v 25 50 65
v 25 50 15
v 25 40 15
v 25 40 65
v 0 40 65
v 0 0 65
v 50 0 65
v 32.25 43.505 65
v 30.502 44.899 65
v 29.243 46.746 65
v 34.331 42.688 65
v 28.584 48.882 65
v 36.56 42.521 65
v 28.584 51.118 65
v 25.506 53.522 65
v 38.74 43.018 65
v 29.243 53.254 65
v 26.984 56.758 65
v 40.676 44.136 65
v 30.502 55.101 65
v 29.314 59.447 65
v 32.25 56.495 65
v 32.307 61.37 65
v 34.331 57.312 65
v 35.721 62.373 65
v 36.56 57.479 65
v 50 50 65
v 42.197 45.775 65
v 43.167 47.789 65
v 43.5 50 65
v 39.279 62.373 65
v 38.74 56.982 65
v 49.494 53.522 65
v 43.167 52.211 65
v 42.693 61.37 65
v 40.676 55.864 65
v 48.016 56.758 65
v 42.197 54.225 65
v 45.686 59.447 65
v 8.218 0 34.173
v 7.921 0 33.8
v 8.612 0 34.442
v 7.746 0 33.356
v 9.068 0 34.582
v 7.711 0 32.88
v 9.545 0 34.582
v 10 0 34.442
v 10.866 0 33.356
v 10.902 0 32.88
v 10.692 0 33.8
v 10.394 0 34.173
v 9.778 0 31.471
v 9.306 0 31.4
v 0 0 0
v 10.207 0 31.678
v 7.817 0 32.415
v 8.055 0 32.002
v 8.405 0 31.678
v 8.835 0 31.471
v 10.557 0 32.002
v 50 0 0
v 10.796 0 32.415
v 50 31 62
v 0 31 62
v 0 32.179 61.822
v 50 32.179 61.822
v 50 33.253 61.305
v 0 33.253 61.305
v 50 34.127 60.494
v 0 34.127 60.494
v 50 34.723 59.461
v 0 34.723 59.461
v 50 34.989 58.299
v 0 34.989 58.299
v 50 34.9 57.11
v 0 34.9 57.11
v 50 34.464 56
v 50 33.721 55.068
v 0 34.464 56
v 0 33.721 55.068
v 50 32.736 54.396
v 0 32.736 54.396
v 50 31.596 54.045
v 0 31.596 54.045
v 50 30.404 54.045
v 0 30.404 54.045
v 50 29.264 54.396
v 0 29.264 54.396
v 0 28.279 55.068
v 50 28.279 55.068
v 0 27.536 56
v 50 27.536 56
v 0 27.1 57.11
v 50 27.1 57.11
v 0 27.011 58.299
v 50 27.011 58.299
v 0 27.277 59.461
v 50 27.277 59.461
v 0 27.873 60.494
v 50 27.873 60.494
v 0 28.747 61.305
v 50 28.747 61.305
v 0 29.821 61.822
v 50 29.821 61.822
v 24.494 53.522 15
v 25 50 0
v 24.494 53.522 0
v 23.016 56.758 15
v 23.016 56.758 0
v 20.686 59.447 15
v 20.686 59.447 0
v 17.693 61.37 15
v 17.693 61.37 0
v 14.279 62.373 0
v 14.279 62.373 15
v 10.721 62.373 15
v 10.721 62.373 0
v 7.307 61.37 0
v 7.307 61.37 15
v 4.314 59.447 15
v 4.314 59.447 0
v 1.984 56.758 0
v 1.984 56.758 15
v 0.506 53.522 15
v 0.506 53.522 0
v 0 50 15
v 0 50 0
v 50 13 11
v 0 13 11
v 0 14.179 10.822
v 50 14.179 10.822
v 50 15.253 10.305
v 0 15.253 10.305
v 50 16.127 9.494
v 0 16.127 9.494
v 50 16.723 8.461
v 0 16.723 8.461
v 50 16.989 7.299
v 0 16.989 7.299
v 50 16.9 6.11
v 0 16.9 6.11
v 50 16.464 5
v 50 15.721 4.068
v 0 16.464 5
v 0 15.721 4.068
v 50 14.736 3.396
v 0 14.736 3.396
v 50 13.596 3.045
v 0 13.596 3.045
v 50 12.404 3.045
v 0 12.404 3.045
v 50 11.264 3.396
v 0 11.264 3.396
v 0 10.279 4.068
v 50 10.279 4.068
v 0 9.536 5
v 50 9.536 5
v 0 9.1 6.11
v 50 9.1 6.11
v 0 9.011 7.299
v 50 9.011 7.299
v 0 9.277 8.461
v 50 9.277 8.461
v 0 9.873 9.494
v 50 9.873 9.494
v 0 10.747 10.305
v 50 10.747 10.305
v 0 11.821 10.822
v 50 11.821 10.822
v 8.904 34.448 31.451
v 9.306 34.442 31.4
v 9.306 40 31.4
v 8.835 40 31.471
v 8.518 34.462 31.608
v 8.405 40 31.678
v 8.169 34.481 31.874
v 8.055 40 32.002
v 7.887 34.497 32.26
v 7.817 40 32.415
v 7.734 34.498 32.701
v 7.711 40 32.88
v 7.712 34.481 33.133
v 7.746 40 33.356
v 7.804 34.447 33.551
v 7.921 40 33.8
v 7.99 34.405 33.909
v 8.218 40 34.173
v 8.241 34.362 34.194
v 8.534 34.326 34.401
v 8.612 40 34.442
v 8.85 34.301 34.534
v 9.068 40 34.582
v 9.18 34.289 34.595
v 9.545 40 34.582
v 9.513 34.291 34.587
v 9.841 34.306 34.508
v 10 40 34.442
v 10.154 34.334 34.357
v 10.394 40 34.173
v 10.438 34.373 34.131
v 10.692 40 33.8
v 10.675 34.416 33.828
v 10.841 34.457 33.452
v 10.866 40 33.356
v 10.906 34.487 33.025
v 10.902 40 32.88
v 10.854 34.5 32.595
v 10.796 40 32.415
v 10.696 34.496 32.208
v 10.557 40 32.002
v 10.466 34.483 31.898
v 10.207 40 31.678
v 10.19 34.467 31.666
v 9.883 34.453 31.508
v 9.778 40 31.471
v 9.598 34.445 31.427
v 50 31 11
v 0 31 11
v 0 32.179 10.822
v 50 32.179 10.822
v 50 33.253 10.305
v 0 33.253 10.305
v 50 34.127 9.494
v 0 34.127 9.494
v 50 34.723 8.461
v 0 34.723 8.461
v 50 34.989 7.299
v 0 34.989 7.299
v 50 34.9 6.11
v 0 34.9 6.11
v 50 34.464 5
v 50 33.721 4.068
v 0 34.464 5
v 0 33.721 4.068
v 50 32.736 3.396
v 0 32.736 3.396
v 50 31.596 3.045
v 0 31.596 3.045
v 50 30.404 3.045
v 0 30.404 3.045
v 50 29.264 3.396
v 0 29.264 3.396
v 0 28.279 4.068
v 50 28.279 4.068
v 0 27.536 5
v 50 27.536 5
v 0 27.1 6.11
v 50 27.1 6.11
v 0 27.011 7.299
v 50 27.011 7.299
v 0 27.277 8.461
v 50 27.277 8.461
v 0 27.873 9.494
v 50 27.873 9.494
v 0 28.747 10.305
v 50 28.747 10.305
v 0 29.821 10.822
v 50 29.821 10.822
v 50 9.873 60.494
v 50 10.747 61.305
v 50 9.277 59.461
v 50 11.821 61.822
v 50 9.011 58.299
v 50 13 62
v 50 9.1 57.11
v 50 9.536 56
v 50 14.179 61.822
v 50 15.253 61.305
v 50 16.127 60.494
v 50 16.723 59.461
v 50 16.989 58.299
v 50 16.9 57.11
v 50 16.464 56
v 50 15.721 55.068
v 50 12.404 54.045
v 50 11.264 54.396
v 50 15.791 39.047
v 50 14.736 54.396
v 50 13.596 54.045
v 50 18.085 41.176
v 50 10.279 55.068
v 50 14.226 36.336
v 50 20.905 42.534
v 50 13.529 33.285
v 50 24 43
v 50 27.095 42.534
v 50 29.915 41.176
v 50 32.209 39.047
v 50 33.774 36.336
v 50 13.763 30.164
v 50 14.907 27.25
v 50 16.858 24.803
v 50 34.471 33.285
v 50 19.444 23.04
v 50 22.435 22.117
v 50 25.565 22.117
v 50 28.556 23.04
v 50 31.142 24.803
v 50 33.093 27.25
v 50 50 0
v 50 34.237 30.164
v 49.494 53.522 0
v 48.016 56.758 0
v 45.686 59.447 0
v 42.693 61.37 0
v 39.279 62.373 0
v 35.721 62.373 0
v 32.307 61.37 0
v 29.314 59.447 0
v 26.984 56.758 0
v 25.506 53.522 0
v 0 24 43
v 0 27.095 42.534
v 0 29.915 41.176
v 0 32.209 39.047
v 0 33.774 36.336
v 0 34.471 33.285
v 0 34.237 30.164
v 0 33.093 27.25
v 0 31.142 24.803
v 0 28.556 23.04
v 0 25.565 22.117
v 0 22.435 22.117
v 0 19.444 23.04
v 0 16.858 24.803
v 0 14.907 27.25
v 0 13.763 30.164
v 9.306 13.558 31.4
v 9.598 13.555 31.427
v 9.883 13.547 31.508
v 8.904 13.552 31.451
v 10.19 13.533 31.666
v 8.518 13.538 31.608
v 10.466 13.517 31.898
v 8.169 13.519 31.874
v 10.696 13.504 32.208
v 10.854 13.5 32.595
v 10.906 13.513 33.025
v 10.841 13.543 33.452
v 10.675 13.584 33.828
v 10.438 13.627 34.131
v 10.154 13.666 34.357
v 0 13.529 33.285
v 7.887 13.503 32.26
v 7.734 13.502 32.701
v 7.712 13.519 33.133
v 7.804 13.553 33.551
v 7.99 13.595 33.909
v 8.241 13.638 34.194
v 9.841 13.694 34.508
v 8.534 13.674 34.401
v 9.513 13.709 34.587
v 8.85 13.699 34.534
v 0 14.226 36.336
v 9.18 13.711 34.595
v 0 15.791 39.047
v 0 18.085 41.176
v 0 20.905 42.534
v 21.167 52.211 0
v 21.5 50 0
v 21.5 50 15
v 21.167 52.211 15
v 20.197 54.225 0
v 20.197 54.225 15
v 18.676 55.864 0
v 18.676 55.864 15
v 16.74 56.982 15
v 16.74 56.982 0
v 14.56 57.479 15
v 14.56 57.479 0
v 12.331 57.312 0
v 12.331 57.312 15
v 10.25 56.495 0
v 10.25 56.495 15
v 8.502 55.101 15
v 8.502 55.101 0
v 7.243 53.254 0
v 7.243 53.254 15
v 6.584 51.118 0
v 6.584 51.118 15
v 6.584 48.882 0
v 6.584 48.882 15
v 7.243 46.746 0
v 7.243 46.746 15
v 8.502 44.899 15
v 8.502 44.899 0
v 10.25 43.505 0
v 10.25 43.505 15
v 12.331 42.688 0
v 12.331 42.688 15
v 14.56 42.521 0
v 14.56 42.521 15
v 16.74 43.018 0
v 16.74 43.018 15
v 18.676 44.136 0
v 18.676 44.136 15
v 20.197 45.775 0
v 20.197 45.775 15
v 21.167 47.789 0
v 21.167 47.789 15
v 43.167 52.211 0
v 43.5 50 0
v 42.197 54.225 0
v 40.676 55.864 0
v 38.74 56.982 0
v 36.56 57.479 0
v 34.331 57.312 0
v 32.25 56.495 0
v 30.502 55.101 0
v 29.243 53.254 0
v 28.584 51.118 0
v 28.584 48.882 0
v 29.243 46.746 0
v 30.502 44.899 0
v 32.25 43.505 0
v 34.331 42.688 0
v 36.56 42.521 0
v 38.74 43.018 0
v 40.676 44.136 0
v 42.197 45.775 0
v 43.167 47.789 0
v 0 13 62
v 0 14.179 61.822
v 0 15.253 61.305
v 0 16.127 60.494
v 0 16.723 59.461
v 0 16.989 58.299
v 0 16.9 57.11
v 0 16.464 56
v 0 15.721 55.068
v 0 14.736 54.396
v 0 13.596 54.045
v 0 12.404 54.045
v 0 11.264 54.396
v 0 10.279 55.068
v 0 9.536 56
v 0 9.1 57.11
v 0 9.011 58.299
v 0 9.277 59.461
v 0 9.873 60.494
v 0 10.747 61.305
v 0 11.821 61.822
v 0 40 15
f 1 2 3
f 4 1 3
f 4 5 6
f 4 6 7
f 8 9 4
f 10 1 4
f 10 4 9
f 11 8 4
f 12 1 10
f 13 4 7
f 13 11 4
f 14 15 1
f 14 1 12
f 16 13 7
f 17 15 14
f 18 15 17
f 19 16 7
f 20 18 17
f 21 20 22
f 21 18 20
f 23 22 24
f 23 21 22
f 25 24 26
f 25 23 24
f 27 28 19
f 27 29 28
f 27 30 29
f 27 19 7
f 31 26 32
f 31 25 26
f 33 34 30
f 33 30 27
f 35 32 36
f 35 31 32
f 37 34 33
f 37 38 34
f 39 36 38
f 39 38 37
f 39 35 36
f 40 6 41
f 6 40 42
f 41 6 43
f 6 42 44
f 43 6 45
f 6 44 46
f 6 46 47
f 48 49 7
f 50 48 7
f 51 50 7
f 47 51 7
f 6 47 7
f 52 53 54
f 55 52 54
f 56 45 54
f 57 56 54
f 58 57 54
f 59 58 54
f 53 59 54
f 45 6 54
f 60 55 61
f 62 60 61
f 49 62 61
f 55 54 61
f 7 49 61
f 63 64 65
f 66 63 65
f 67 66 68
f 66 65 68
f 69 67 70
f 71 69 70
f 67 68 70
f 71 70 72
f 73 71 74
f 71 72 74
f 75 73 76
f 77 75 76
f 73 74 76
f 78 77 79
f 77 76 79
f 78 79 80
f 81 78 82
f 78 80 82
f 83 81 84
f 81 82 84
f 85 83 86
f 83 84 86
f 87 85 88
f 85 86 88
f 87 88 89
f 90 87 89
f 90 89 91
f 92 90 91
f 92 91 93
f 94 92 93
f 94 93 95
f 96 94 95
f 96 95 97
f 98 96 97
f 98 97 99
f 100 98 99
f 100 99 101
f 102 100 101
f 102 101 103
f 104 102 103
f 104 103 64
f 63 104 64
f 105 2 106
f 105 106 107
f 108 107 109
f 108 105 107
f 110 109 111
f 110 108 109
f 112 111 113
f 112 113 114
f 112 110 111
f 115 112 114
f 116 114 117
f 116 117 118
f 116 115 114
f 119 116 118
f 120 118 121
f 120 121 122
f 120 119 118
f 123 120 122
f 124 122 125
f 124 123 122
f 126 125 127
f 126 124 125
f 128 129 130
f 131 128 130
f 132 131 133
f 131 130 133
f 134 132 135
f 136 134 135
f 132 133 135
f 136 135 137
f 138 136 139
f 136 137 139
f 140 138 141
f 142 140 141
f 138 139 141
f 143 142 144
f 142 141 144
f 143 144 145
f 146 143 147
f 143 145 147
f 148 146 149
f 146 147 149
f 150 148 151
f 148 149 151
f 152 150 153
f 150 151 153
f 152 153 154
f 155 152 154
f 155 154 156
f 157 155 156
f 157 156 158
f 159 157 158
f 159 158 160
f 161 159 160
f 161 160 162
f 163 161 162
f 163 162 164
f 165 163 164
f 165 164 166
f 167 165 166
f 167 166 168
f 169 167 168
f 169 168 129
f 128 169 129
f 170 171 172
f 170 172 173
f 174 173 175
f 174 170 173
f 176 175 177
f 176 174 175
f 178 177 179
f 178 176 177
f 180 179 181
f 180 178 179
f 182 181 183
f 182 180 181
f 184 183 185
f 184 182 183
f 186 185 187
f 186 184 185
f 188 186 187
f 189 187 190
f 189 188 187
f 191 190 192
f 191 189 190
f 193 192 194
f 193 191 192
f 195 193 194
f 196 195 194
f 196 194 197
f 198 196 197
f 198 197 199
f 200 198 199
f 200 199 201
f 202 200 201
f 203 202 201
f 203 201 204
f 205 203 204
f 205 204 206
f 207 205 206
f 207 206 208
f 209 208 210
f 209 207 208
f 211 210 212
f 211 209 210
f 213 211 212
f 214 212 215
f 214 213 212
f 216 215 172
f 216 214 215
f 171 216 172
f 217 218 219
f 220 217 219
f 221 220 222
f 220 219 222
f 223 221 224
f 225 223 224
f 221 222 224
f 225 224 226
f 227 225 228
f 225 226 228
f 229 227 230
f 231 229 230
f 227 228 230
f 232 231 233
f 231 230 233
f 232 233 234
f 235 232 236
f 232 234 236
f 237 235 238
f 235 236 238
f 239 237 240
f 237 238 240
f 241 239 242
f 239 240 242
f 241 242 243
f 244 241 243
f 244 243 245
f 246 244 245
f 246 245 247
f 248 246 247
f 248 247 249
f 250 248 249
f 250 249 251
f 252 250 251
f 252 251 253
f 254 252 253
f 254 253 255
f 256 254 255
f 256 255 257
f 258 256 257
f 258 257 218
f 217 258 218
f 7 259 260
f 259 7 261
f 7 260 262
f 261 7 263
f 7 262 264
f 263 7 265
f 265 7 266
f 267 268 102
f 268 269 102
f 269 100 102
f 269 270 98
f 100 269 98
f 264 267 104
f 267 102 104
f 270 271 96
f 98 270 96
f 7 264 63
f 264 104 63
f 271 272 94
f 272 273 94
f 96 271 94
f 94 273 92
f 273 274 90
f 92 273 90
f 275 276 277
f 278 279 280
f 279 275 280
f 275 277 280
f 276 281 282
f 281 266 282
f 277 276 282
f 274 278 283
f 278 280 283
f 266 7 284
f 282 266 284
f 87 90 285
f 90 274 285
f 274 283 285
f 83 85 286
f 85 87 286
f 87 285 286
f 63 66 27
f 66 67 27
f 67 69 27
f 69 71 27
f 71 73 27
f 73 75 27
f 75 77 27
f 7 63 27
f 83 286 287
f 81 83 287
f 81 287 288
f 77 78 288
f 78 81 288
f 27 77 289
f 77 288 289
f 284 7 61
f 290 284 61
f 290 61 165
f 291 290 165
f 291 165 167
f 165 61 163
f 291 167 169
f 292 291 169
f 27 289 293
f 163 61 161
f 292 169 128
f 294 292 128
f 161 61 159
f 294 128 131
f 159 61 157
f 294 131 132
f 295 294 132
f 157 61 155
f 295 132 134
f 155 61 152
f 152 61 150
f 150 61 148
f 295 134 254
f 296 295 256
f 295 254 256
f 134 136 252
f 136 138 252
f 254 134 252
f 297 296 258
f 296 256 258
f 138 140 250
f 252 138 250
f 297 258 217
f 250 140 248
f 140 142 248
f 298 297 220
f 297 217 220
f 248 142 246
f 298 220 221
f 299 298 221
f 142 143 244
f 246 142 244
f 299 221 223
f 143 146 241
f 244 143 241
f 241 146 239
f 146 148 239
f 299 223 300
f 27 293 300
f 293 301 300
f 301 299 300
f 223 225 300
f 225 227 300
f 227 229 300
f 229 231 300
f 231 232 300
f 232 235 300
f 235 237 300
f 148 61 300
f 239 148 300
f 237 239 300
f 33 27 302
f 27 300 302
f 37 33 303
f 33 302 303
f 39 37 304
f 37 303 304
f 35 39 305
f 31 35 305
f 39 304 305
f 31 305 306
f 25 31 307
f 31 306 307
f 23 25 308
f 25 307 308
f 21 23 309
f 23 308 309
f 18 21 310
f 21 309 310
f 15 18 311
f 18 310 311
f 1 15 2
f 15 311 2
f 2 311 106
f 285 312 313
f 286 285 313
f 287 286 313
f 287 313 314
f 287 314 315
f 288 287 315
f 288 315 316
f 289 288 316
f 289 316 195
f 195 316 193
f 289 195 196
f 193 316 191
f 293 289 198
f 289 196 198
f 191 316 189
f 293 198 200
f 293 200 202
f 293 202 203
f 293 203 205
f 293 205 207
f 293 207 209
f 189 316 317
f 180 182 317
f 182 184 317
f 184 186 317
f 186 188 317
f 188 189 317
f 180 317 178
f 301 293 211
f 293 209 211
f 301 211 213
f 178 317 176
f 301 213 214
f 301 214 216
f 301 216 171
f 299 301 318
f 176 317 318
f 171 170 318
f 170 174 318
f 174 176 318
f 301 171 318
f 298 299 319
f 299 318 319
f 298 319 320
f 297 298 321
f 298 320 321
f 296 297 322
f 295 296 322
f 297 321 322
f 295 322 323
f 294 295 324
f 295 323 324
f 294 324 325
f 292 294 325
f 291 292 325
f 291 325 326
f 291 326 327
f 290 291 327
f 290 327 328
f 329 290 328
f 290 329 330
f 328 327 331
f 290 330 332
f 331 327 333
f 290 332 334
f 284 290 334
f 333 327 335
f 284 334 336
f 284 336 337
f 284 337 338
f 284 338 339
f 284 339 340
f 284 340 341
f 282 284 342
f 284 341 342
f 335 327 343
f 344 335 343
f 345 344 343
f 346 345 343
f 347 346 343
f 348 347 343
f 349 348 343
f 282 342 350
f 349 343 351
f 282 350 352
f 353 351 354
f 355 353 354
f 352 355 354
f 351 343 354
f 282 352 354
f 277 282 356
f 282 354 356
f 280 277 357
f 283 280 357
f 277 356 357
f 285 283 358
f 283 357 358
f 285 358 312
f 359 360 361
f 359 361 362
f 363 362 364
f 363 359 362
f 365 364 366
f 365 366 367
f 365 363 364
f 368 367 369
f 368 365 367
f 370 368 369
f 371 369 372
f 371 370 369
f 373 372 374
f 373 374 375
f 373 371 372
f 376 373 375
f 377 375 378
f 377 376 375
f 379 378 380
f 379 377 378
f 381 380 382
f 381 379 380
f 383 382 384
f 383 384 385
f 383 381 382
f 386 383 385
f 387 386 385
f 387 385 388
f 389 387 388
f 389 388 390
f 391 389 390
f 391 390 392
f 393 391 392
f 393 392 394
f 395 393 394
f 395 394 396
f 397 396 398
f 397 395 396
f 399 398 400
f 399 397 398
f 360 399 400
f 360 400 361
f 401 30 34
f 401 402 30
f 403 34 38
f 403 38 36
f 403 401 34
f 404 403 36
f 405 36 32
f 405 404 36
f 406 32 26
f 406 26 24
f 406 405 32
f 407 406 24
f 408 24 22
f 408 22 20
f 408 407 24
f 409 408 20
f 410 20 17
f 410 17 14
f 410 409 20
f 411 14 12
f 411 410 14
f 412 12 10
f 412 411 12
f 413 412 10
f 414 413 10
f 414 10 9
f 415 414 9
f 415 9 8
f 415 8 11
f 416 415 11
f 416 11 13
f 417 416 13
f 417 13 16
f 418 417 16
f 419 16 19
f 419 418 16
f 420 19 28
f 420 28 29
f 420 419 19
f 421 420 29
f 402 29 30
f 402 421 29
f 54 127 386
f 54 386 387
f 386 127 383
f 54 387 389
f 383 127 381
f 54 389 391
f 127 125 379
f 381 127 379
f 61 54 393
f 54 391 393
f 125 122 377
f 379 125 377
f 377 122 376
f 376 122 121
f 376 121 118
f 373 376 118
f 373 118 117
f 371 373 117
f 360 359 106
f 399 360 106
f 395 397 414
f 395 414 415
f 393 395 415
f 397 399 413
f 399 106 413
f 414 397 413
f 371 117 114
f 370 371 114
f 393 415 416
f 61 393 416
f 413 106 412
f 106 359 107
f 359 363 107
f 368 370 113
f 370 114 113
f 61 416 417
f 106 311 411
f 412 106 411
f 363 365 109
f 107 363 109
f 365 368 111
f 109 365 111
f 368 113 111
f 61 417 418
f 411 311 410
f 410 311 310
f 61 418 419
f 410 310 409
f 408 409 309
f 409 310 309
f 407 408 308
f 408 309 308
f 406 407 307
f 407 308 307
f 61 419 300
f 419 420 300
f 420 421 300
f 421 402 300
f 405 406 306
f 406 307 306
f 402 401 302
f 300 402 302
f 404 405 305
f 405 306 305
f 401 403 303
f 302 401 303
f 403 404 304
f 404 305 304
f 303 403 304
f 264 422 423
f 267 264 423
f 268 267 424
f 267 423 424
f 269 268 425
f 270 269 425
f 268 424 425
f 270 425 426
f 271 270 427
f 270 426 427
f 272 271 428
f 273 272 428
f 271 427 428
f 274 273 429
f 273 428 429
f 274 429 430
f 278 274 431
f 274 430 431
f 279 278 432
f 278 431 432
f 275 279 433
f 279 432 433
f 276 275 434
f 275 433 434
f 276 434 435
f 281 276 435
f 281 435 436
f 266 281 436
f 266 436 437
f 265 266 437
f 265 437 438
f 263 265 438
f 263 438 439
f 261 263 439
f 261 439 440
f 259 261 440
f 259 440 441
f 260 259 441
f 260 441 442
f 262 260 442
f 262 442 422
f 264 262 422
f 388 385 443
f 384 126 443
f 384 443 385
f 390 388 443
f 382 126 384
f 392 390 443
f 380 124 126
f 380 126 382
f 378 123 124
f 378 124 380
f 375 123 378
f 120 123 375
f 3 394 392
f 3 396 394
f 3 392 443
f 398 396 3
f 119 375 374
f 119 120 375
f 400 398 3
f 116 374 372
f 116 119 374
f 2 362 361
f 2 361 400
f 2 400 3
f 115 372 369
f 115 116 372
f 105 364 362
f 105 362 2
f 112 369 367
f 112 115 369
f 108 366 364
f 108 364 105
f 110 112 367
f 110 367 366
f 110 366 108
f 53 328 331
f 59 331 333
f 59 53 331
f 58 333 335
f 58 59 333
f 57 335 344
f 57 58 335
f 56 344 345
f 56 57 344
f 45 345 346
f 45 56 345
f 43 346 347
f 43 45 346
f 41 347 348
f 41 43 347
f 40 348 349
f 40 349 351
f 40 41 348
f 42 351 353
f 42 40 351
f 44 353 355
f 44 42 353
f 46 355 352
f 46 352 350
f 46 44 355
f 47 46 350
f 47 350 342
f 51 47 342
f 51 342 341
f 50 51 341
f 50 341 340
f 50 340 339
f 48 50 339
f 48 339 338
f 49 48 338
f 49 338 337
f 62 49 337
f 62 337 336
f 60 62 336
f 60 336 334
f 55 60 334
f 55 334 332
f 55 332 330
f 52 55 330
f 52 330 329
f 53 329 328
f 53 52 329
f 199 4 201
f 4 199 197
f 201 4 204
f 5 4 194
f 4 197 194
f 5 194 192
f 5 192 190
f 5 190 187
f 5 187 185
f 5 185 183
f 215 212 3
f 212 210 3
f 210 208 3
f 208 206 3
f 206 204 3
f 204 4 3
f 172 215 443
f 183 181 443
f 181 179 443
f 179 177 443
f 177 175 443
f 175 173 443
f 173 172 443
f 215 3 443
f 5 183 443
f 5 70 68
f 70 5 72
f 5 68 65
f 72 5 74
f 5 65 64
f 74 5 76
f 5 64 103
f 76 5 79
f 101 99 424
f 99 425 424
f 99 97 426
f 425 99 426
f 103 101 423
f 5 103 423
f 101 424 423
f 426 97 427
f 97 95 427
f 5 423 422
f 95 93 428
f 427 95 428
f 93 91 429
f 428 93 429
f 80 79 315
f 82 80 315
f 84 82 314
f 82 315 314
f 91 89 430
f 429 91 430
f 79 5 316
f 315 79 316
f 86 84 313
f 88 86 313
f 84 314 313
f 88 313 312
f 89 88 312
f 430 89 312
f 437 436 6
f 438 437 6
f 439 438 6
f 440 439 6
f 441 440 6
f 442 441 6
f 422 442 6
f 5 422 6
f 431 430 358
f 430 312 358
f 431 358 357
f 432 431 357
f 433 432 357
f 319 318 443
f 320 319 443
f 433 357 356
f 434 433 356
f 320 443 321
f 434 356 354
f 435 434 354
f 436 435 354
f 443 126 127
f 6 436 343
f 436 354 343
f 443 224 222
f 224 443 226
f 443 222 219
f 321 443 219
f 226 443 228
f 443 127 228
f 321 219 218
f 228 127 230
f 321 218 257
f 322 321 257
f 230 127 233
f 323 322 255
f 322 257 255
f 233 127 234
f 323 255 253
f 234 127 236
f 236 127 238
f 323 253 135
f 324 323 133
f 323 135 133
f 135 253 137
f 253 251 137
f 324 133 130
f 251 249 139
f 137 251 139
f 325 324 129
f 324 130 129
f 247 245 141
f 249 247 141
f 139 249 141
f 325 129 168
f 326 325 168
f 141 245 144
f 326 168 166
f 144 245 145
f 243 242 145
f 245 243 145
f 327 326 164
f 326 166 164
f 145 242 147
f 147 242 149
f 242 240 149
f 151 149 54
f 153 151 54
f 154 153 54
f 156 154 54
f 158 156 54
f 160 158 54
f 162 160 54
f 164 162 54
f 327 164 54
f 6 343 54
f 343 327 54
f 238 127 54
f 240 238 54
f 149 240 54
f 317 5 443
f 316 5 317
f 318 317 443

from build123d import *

# Parameters (mm, degrees)
SKETCH1_R               = 7.5
BOSS_EXTRUDE1_DEPTH     = 15
SKETCH2_R               = 7.5
BOSS_EXTRUDE2_DEPTH     = 50
SKETCH3_W               = 50
SKETCH3_H               = 40
BOSS_EXTRUDE3_DEPTH     = 65
CUT_EXTRUDE2_DEPTH      = 96.372952141
SKETCH9_R               = 4
SKETCH9_R_2             = 10.5
CUT_EXTRUDE3_DEPTH      = 104.107953137
CUT_EXTRUDE4_DEPTH      = 92.241437954
CUT_EXTRUDE4_DEPTH_BACK = 92.241437954
SKETCH10_R              = 1.6


with BuildPart() as part:
    # Sketch1 → Boss-Extrude1 (new body)
    with BuildSketch(Plane.XY):
        with BuildLine():
            Line((0, 0), (50, 0))
            Line((50, 0), (50, 50))
            ThreePointArc((50, 50), (40.582575695, 63.228756555), (25, 58.660254038))
            ThreePointArc((25, 58.660254038), (9.417424305, 63.228756555), (0, 50))
            Line((0, 50), (0, 0))
        make_face()
        with Locations((36, 50)):
            Circle(SKETCH1_R, mode=Mode.SUBTRACT)
        with Locations((14, 50)):
            Circle(SKETCH1_R, mode=Mode.SUBTRACT)
    extrude(amount=BOSS_EXTRUDE1_DEPTH)

    # Sketch2 → Boss-Extrude2 (add)
    with BuildSketch(Plane.XY.offset(15)):
        with BuildLine():
            Line((25, 50), (25, 0))
            Line((25, 0), (50, 0))
            Line((50, 0), (50, 50))
            ThreePointArc((50, 50), (37.5, 62.5), (25, 50))
        make_face()
        with Locations((36, 50)):
            Circle(SKETCH2_R, mode=Mode.SUBTRACT)
    extrude(amount=BOSS_EXTRUDE2_DEPTH)

    # Sketch3 → Boss-Extrude3 (add)
    with BuildSketch(Plane(origin=(0, 0, 0), x_dir=(-1, 0, 0), z_dir=(0, 0, -1))):
        with Locations((-25, 20)):
            Rectangle(SKETCH3_W, SKETCH3_H)
    extrude(amount=-BOSS_EXTRUDE3_DEPTH)

    # Sketch2<3> → Cut-Extrude2 (cut, through all)
    with BuildSketch(Plane.XY.offset(15)):
        with BuildLine():
            ThreePointArc((25, 58.660254038), (9.417424305, 63.228756555), (0, 50))
            ThreePointArc((0, 50), (12.5, 62.5), (25, 50))
            ThreePointArc((25, 50), (37.5, 62.5), (50, 50))
            ThreePointArc((50, 50), (40.582575695, 63.228756555), (25, 58.660254038))
        make_face()
    extrude(amount=-CUT_EXTRUDE2_DEPTH, mode=Mode.SUBTRACT)

    # Sketch9 → Cut-Extrude3 (cut, through all)
    with BuildSketch(Plane.ZY):
        with Locations((7, 13)):
            Circle(SKETCH9_R)
        with Locations((58, 13)):
            Circle(SKETCH9_R)
        with Locations((58, 31)):
            Circle(SKETCH9_R)
        with Locations((7, 31)):
            Circle(SKETCH9_R)
        with Locations((32.5, 24)):
            Circle(SKETCH9_R_2)
    extrude(amount=-CUT_EXTRUDE3_DEPTH, mode=Mode.SUBTRACT)

    # Sketch10 → Cut-Extrude4 (cut, two sides: drawn at the far end of the back side and taken through both)
    with BuildSketch(Plane(origin=(0, 40, 0), x_dir=(1, 0, 0), z_dir=(0, 1, 0)).offset(-CUT_EXTRUDE4_DEPTH_BACK)):
        with Locations((9.306144925, -33)):
            Circle(SKETCH10_R)
    extrude(amount=CUT_EXTRUDE4_DEPTH + CUT_EXTRUDE4_DEPTH_BACK, mode=Mode.SUBTRACT)


solid = part.part
